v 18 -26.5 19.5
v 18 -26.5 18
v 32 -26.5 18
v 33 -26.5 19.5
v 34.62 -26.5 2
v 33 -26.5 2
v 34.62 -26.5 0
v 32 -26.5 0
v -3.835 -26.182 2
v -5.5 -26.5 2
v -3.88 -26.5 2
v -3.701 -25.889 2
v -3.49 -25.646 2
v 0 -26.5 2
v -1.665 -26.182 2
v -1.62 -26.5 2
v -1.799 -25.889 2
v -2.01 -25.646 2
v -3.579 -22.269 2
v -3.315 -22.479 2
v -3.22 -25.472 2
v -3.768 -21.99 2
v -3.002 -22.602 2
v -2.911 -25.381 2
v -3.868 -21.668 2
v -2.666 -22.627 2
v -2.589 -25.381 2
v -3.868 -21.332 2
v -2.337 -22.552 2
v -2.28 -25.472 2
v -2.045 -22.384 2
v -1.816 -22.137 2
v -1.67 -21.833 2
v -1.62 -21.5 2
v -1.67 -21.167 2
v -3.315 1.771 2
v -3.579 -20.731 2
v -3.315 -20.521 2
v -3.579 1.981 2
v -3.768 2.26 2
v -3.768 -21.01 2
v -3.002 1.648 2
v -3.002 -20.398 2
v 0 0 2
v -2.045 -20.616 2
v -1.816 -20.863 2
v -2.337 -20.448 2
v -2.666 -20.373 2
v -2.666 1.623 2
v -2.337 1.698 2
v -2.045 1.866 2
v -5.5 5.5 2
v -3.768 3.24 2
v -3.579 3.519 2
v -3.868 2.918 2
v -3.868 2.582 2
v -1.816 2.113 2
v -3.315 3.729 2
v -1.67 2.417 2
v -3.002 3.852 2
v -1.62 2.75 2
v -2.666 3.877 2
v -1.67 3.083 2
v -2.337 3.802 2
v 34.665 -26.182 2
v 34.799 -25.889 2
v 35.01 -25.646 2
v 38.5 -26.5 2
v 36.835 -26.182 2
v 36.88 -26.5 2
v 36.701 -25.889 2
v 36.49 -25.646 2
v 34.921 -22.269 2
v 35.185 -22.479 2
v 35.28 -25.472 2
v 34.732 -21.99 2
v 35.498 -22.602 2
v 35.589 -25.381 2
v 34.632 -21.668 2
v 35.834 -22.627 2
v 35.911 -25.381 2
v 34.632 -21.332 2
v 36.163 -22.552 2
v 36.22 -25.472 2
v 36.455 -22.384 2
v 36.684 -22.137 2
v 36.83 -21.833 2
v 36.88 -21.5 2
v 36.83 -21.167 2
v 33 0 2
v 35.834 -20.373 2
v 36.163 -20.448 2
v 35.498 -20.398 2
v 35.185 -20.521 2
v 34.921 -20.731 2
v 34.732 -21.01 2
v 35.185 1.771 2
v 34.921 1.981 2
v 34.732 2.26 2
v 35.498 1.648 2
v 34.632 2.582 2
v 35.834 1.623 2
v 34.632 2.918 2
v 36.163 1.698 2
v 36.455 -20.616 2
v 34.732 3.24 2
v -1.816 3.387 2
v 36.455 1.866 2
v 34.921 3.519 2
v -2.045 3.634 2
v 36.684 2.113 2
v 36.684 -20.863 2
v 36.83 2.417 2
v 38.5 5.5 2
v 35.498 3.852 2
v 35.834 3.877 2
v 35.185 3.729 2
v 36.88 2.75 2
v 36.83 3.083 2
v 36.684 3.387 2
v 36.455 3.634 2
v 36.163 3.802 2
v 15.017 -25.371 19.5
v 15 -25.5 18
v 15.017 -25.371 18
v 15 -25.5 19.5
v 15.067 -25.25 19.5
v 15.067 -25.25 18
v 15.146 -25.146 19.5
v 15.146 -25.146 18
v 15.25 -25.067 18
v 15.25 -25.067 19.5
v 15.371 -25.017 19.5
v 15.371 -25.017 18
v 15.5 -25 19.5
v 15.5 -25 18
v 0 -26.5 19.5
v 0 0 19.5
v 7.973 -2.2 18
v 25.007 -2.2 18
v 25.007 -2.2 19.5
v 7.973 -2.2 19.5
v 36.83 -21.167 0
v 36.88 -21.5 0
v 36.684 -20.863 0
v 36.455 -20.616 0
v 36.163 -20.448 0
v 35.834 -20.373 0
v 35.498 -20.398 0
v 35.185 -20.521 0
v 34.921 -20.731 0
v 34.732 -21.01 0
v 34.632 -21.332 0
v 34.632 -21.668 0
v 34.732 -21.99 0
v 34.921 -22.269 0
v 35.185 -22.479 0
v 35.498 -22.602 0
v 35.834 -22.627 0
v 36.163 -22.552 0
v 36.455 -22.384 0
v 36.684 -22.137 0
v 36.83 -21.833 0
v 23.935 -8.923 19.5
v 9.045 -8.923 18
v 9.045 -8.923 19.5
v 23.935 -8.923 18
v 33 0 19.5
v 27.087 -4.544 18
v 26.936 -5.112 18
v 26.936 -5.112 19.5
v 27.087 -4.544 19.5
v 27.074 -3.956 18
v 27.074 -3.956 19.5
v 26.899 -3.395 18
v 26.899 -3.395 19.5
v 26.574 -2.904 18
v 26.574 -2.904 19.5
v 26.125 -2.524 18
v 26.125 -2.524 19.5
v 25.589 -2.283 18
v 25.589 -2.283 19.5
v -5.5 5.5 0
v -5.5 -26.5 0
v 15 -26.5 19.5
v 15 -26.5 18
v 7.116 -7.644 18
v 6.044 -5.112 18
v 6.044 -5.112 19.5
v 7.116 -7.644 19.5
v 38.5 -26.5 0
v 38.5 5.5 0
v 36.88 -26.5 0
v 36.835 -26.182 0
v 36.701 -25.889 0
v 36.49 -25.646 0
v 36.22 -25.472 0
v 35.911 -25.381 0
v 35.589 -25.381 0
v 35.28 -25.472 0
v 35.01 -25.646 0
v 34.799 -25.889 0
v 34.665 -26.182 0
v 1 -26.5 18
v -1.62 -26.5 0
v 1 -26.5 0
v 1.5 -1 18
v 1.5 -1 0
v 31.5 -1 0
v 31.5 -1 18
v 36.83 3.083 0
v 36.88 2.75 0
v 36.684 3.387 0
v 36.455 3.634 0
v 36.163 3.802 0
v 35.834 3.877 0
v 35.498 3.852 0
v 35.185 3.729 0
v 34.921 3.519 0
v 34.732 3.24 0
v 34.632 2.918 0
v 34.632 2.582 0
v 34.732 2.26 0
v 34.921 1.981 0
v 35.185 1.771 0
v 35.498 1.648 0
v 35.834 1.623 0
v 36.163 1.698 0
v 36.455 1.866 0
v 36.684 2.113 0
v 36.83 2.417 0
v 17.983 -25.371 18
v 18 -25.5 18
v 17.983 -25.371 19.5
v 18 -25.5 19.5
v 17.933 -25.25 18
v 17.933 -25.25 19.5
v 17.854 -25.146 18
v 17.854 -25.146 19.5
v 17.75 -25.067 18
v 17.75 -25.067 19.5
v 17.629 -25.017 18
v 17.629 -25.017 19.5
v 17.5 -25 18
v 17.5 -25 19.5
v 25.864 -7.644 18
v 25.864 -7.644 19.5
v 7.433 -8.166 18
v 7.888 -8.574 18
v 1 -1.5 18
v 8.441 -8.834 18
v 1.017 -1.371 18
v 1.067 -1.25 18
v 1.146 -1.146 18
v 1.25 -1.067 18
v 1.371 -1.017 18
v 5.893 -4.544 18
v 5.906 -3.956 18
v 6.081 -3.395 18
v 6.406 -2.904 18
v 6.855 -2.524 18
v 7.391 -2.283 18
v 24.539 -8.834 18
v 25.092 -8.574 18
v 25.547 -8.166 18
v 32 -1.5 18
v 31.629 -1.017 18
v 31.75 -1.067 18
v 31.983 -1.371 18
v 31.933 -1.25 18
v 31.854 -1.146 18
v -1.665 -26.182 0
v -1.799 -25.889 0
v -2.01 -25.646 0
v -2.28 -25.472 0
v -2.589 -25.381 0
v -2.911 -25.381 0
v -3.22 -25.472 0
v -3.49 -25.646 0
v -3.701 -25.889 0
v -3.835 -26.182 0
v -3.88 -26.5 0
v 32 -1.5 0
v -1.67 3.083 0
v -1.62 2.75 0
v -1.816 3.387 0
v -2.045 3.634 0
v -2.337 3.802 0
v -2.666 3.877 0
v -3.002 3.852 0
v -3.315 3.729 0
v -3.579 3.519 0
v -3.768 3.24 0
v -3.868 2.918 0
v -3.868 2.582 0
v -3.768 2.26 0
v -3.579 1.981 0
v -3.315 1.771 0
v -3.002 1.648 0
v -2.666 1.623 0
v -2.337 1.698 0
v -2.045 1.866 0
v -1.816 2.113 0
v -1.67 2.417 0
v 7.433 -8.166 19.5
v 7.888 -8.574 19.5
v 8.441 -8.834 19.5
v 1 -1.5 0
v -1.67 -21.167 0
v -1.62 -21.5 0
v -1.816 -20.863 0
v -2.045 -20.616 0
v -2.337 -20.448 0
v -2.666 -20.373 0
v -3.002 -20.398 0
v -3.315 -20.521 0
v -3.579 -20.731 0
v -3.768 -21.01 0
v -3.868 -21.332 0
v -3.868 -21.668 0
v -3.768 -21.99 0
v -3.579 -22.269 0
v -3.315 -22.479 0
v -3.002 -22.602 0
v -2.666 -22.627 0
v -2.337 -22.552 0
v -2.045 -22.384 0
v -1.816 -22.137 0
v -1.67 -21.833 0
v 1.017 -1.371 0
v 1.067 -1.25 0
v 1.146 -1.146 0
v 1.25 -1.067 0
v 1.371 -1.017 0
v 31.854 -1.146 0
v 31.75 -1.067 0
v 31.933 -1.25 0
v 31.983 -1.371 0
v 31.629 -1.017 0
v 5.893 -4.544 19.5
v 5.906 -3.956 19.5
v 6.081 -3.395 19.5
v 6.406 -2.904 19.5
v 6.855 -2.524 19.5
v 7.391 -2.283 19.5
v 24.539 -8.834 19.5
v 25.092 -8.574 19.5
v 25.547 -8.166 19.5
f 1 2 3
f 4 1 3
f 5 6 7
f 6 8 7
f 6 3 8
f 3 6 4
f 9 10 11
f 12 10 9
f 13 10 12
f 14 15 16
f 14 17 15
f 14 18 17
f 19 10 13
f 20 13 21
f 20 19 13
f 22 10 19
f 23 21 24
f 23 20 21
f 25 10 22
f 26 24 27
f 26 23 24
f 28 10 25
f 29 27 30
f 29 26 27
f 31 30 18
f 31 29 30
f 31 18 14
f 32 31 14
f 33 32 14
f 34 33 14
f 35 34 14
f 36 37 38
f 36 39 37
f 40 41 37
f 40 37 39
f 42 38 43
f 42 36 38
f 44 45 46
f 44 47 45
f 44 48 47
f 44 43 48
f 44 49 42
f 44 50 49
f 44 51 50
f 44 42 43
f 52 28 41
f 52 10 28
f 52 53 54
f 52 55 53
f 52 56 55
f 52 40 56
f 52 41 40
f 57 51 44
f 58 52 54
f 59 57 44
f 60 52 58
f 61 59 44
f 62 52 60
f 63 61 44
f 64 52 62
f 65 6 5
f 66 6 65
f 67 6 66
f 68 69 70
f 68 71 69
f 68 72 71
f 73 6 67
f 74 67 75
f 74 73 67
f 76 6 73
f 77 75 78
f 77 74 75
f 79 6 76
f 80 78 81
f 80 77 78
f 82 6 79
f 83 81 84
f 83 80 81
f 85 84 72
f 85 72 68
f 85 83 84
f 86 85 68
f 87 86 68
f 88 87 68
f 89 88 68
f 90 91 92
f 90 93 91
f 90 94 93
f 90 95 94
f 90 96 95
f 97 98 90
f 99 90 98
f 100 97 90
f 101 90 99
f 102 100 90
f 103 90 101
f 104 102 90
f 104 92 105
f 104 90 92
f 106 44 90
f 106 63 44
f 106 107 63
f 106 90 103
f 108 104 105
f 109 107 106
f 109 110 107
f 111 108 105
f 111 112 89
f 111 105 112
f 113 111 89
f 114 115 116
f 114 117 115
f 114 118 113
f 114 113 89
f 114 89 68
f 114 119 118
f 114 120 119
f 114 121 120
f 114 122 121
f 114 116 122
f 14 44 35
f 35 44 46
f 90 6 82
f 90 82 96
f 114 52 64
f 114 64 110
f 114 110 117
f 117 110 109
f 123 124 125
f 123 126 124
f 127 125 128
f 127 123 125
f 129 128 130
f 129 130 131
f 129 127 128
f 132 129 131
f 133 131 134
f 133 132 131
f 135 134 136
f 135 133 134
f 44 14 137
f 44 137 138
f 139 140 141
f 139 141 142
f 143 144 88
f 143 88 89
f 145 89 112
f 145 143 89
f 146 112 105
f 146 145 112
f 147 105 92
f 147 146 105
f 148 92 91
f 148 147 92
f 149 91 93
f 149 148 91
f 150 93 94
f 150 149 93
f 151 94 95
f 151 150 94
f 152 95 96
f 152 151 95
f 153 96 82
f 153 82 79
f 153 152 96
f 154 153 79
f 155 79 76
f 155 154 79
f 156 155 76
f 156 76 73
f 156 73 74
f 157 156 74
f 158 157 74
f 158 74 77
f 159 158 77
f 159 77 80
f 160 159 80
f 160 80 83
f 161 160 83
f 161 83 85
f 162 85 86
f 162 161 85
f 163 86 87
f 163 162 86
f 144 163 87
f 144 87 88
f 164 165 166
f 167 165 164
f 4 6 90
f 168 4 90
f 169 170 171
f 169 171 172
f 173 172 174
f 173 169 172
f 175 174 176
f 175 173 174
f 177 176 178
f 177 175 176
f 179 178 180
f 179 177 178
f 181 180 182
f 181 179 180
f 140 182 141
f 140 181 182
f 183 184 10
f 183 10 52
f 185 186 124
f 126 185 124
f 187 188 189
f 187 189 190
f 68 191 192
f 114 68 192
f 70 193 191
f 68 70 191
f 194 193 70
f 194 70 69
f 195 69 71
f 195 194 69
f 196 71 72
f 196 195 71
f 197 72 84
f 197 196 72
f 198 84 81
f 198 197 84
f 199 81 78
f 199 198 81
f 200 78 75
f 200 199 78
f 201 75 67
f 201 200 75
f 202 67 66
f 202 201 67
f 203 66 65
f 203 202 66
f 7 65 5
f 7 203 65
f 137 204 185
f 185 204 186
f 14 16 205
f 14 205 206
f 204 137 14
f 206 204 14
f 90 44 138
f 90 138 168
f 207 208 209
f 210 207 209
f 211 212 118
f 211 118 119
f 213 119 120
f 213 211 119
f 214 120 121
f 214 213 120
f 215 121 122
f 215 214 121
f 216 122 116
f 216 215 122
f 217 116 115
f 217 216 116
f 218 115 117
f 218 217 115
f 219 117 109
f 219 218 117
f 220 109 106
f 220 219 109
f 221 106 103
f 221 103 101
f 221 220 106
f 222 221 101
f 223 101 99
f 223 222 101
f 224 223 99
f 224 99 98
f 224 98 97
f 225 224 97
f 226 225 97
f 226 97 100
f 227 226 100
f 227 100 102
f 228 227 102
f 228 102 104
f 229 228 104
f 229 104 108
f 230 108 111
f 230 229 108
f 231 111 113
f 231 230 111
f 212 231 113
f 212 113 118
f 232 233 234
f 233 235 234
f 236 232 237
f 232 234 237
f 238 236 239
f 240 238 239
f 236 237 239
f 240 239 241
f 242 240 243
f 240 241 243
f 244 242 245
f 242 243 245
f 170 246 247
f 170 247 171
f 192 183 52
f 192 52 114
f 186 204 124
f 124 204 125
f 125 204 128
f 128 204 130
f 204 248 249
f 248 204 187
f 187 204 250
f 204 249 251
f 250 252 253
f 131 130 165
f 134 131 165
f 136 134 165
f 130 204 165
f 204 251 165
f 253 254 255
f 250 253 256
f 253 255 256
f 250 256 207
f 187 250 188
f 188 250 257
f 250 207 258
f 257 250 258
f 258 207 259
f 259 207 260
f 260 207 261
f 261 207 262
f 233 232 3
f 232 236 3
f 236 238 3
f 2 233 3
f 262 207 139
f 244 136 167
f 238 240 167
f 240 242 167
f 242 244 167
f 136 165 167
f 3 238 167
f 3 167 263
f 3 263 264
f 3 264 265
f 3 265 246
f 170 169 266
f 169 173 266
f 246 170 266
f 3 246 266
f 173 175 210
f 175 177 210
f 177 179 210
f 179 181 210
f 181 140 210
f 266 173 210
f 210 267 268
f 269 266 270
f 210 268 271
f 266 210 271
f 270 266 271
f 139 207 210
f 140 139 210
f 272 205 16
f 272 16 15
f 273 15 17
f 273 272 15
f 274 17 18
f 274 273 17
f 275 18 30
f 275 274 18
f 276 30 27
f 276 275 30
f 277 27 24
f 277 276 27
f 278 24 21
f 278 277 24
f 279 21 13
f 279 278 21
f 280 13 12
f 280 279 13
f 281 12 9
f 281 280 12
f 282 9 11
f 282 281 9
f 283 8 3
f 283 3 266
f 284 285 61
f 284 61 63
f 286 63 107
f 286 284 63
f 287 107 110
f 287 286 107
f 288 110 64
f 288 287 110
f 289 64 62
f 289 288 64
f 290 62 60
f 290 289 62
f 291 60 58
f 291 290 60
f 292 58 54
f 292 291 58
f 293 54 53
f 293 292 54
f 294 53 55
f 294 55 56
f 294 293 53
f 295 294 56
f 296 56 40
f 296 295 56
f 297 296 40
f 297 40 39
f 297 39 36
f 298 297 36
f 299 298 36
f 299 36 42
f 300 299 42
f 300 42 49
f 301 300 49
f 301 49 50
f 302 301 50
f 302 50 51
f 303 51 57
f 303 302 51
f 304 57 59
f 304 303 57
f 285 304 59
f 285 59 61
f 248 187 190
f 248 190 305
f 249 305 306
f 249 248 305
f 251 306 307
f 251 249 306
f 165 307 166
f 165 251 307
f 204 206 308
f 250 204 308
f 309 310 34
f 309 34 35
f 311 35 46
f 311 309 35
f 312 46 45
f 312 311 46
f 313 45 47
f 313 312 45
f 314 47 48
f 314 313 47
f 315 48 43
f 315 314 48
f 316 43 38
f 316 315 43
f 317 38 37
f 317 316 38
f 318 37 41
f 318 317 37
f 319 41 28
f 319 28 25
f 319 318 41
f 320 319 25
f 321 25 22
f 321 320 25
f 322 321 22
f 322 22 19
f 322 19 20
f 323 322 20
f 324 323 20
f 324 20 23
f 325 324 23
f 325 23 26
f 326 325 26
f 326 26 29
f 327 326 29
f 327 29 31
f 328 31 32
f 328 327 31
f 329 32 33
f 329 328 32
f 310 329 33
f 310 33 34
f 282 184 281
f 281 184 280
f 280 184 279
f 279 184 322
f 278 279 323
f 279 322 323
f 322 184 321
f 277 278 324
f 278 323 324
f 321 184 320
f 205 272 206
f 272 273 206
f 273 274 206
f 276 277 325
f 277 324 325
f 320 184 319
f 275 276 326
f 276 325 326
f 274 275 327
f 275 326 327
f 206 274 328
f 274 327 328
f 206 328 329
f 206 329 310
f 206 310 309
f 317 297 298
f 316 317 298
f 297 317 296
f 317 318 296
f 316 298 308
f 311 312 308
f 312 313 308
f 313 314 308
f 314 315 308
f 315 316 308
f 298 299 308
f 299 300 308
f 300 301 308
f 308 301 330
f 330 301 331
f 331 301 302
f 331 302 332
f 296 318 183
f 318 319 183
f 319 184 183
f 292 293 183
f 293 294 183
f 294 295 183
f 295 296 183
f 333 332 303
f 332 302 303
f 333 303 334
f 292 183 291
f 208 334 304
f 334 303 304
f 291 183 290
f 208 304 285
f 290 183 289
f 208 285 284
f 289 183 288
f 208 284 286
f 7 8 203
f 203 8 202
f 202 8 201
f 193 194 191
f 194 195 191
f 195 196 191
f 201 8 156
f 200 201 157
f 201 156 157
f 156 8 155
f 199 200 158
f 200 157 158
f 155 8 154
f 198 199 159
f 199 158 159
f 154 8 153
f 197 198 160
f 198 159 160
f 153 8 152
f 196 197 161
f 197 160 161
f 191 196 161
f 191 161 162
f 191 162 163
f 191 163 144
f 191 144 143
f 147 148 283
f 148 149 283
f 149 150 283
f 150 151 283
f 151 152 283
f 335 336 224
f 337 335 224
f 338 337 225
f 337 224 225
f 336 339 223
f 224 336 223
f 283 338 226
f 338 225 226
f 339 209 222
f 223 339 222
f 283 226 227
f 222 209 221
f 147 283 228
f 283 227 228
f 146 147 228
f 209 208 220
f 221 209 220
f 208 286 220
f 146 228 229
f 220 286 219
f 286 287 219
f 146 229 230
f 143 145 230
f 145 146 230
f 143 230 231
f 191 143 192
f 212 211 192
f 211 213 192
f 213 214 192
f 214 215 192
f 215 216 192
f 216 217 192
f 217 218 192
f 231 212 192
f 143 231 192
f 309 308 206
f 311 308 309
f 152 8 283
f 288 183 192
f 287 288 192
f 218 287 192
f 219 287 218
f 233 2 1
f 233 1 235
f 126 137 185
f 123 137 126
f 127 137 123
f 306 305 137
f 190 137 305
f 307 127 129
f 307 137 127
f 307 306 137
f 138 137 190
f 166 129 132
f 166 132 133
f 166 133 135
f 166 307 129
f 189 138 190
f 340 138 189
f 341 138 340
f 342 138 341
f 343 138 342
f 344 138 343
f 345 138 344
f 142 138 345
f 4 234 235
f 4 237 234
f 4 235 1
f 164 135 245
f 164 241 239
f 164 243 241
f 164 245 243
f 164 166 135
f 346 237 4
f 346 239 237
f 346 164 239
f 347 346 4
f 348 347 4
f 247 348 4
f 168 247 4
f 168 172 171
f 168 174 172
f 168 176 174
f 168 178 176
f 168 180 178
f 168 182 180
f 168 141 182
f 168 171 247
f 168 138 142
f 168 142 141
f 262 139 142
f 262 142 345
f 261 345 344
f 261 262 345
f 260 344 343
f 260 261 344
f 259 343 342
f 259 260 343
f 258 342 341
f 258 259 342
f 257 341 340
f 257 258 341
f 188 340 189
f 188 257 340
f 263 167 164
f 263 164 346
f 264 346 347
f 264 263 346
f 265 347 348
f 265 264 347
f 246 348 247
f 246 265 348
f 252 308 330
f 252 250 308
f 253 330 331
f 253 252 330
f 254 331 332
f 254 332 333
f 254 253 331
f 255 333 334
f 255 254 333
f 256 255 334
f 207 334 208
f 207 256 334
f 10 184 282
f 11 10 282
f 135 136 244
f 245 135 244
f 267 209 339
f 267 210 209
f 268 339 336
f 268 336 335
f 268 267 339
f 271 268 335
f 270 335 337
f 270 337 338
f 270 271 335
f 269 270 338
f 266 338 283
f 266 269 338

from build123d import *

# Parameters (mm, degrees)
SKETCH1_W                   = 33
SKETCH1_H                   = 53
SKETCH1_W_2                 = 31
SKETCH1_H_2                 = 51
WALL_HEIGHT_DEPTH           = 18
ROOF_START                  = 18
SKETCH1_3_W                 = 33
SKETCH1_3_H                 = 53
SKETCH1_3_W_2               = 3
SKETCH1_3_H_2               = 3
ROOF_DEPTH                  = 1.5
SKETCH1_5_W                 = 44
SKETCH1_5_H                 = 64
SKETCH1_5_R                 = 1.1303
SKETCH1_5_W_2               = 33
SKETCH1_5_H_2               = 53
SCREW_LIP_DEPTH             = 2
MICRO_D_START               = 18
MICRO_D_FEMALE_CUTOUT_DEPTH = 1.5
FILLET1_R                   = 0.5
SKETCH4_W                   = 44
SKETCH4_H                   = 32
CUT_EXTRUDE3_DEPTH          = 19.5


# Read off the part's stored shape, not the designer's step: Micro-D Female Cutout
with BuildPart() as part:
    # Sketch1 → Wall_Height (new body)
    with BuildSketch(Plane.XY):
        with Locations((16.5, -26.5)):
            Rectangle(SKETCH1_W, SKETCH1_H)
        with Locations((16.5, -26.5)):
            Rectangle(SKETCH1_W_2, SKETCH1_H_2, mode=Mode.SUBTRACT)
    extrude(amount=WALL_HEIGHT_DEPTH)

    # Sketch1<3> → Roof (add)
    with BuildSketch(Plane.XY.offset(ROOF_START)):
        with Locations((16.5, -26.5)):
            Rectangle(SKETCH1_3_W, SKETCH1_3_H)
        with Locations((16.5, -26.5)):
            Rectangle(SKETCH1_3_W_2, SKETCH1_3_H_2, mode=Mode.SUBTRACT)
    extrude(amount=ROOF_DEPTH)

    # Sketch1<5> → Screw_Lip (add)
    with BuildSketch(Plane.XY):
        with Locations((16.5, -26.5)):
            Rectangle(SKETCH1_5_W, SKETCH1_5_H)
        with Locations((35.75, -31.5)):
            Circle(SKETCH1_5_R, mode=Mode.SUBTRACT)
        with Locations((35.75, -21.5)):
            Circle(SKETCH1_5_R, mode=Mode.SUBTRACT)
        with Locations((-2.75, -31.5)):
            Circle(SKETCH1_5_R, mode=Mode.SUBTRACT)
        with Locations((-2.75, -21.5)):
            Circle(SKETCH1_5_R, mode=Mode.SUBTRACT)
        with Locations((35.75, -55.75)):
            Circle(SKETCH1_5_R, mode=Mode.SUBTRACT)
        with Locations((35.75, -26.5)):
            Circle(SKETCH1_5_R, mode=Mode.SUBTRACT)
        with Locations((-2.75, -26.5)):
            Circle(SKETCH1_5_R, mode=Mode.SUBTRACT)
        with Locations((-2.75, -55.75)):
            Circle(SKETCH1_5_R, mode=Mode.SUBTRACT)
        with Locations((-2.75, 2.75)):
            Circle(SKETCH1_5_R, mode=Mode.SUBTRACT)
        with Locations((35.75, 2.75)):
            Circle(SKETCH1_5_R, mode=Mode.SUBTRACT)
        with Locations((16.5, -26.5)):
            Rectangle(SKETCH1_5_W_2, SKETCH1_5_H_2, mode=Mode.SUBTRACT)
    extrude(amount=SCREW_LIP_DEPTH)

    # Micro-D Female Cutout outline → Micro-D Female Cutout (cut)
    with BuildSketch(Plane.XY.offset(MICRO_D_START)):
        with BuildLine():
            Line((9.045291306, -8.922906796), (23.934708694, -8.922906796))
            ThreePointArc((23.934708694, -8.922906796), (25.091998708, -8.574294286), (25.86418098, -7.644463442))
            Line((25.86418098, -7.644463442), (26.936222286, -5.112028361))
            ThreePointArc((26.936222286, -5.112028361), (26.753373348, -3.137945843), (25.00675, -2.2))
            Line((25.00675, -2.2), (7.97325, -2.2))
            ThreePointArc((7.97325, -2.2), (6.226626652, -3.137945843), (6.043777714, -5.112028361))
            Line((6.043777714, -5.112028361), (7.11581902, -7.644463442))
            ThreePointArc((7.11581902, -7.644463442), (7.888001292, -8.574294286), (9.045291306, -8.922906796))
        make_face()
    micro_d_female_cutout = extrude(amount=MICRO_D_FEMALE_CUTOUT_DEPTH, mode=Mode.SUBTRACT)

    # Micro-D Cutout Mirror: Micro-D Female Cutout across plane
    add(micro_d_female_cutout.mirror(Plane.ZX.offset(-26.5)), mode=Mode.SUBTRACT)

    # Fillet1
    fillet1_edges = [part.edges().sort_by_distance(p)[0] for p in [
        (1, -1, 9),
        (1, -52, 9),
        (32, -52, 9),
        (32, -1, 9),
        (15, -28, 18.75),
        (18, -28, 18.75),
        (18, -25, 18.75),
        (15, -25, 18.75),
    ]]
    fillet(fillet1_edges, radius=FILLET1_R)

    # Sketch4 → Cut-Extrude3 (cut)
    with BuildSketch(Plane.XY):
        with Locations((16.5, -42.5)):
            Rectangle(SKETCH4_W, SKETCH4_H)
    extrude(amount=CUT_EXTRUDE3_DEPTH, mode=Mode.SUBTRACT)


solid = part.part
